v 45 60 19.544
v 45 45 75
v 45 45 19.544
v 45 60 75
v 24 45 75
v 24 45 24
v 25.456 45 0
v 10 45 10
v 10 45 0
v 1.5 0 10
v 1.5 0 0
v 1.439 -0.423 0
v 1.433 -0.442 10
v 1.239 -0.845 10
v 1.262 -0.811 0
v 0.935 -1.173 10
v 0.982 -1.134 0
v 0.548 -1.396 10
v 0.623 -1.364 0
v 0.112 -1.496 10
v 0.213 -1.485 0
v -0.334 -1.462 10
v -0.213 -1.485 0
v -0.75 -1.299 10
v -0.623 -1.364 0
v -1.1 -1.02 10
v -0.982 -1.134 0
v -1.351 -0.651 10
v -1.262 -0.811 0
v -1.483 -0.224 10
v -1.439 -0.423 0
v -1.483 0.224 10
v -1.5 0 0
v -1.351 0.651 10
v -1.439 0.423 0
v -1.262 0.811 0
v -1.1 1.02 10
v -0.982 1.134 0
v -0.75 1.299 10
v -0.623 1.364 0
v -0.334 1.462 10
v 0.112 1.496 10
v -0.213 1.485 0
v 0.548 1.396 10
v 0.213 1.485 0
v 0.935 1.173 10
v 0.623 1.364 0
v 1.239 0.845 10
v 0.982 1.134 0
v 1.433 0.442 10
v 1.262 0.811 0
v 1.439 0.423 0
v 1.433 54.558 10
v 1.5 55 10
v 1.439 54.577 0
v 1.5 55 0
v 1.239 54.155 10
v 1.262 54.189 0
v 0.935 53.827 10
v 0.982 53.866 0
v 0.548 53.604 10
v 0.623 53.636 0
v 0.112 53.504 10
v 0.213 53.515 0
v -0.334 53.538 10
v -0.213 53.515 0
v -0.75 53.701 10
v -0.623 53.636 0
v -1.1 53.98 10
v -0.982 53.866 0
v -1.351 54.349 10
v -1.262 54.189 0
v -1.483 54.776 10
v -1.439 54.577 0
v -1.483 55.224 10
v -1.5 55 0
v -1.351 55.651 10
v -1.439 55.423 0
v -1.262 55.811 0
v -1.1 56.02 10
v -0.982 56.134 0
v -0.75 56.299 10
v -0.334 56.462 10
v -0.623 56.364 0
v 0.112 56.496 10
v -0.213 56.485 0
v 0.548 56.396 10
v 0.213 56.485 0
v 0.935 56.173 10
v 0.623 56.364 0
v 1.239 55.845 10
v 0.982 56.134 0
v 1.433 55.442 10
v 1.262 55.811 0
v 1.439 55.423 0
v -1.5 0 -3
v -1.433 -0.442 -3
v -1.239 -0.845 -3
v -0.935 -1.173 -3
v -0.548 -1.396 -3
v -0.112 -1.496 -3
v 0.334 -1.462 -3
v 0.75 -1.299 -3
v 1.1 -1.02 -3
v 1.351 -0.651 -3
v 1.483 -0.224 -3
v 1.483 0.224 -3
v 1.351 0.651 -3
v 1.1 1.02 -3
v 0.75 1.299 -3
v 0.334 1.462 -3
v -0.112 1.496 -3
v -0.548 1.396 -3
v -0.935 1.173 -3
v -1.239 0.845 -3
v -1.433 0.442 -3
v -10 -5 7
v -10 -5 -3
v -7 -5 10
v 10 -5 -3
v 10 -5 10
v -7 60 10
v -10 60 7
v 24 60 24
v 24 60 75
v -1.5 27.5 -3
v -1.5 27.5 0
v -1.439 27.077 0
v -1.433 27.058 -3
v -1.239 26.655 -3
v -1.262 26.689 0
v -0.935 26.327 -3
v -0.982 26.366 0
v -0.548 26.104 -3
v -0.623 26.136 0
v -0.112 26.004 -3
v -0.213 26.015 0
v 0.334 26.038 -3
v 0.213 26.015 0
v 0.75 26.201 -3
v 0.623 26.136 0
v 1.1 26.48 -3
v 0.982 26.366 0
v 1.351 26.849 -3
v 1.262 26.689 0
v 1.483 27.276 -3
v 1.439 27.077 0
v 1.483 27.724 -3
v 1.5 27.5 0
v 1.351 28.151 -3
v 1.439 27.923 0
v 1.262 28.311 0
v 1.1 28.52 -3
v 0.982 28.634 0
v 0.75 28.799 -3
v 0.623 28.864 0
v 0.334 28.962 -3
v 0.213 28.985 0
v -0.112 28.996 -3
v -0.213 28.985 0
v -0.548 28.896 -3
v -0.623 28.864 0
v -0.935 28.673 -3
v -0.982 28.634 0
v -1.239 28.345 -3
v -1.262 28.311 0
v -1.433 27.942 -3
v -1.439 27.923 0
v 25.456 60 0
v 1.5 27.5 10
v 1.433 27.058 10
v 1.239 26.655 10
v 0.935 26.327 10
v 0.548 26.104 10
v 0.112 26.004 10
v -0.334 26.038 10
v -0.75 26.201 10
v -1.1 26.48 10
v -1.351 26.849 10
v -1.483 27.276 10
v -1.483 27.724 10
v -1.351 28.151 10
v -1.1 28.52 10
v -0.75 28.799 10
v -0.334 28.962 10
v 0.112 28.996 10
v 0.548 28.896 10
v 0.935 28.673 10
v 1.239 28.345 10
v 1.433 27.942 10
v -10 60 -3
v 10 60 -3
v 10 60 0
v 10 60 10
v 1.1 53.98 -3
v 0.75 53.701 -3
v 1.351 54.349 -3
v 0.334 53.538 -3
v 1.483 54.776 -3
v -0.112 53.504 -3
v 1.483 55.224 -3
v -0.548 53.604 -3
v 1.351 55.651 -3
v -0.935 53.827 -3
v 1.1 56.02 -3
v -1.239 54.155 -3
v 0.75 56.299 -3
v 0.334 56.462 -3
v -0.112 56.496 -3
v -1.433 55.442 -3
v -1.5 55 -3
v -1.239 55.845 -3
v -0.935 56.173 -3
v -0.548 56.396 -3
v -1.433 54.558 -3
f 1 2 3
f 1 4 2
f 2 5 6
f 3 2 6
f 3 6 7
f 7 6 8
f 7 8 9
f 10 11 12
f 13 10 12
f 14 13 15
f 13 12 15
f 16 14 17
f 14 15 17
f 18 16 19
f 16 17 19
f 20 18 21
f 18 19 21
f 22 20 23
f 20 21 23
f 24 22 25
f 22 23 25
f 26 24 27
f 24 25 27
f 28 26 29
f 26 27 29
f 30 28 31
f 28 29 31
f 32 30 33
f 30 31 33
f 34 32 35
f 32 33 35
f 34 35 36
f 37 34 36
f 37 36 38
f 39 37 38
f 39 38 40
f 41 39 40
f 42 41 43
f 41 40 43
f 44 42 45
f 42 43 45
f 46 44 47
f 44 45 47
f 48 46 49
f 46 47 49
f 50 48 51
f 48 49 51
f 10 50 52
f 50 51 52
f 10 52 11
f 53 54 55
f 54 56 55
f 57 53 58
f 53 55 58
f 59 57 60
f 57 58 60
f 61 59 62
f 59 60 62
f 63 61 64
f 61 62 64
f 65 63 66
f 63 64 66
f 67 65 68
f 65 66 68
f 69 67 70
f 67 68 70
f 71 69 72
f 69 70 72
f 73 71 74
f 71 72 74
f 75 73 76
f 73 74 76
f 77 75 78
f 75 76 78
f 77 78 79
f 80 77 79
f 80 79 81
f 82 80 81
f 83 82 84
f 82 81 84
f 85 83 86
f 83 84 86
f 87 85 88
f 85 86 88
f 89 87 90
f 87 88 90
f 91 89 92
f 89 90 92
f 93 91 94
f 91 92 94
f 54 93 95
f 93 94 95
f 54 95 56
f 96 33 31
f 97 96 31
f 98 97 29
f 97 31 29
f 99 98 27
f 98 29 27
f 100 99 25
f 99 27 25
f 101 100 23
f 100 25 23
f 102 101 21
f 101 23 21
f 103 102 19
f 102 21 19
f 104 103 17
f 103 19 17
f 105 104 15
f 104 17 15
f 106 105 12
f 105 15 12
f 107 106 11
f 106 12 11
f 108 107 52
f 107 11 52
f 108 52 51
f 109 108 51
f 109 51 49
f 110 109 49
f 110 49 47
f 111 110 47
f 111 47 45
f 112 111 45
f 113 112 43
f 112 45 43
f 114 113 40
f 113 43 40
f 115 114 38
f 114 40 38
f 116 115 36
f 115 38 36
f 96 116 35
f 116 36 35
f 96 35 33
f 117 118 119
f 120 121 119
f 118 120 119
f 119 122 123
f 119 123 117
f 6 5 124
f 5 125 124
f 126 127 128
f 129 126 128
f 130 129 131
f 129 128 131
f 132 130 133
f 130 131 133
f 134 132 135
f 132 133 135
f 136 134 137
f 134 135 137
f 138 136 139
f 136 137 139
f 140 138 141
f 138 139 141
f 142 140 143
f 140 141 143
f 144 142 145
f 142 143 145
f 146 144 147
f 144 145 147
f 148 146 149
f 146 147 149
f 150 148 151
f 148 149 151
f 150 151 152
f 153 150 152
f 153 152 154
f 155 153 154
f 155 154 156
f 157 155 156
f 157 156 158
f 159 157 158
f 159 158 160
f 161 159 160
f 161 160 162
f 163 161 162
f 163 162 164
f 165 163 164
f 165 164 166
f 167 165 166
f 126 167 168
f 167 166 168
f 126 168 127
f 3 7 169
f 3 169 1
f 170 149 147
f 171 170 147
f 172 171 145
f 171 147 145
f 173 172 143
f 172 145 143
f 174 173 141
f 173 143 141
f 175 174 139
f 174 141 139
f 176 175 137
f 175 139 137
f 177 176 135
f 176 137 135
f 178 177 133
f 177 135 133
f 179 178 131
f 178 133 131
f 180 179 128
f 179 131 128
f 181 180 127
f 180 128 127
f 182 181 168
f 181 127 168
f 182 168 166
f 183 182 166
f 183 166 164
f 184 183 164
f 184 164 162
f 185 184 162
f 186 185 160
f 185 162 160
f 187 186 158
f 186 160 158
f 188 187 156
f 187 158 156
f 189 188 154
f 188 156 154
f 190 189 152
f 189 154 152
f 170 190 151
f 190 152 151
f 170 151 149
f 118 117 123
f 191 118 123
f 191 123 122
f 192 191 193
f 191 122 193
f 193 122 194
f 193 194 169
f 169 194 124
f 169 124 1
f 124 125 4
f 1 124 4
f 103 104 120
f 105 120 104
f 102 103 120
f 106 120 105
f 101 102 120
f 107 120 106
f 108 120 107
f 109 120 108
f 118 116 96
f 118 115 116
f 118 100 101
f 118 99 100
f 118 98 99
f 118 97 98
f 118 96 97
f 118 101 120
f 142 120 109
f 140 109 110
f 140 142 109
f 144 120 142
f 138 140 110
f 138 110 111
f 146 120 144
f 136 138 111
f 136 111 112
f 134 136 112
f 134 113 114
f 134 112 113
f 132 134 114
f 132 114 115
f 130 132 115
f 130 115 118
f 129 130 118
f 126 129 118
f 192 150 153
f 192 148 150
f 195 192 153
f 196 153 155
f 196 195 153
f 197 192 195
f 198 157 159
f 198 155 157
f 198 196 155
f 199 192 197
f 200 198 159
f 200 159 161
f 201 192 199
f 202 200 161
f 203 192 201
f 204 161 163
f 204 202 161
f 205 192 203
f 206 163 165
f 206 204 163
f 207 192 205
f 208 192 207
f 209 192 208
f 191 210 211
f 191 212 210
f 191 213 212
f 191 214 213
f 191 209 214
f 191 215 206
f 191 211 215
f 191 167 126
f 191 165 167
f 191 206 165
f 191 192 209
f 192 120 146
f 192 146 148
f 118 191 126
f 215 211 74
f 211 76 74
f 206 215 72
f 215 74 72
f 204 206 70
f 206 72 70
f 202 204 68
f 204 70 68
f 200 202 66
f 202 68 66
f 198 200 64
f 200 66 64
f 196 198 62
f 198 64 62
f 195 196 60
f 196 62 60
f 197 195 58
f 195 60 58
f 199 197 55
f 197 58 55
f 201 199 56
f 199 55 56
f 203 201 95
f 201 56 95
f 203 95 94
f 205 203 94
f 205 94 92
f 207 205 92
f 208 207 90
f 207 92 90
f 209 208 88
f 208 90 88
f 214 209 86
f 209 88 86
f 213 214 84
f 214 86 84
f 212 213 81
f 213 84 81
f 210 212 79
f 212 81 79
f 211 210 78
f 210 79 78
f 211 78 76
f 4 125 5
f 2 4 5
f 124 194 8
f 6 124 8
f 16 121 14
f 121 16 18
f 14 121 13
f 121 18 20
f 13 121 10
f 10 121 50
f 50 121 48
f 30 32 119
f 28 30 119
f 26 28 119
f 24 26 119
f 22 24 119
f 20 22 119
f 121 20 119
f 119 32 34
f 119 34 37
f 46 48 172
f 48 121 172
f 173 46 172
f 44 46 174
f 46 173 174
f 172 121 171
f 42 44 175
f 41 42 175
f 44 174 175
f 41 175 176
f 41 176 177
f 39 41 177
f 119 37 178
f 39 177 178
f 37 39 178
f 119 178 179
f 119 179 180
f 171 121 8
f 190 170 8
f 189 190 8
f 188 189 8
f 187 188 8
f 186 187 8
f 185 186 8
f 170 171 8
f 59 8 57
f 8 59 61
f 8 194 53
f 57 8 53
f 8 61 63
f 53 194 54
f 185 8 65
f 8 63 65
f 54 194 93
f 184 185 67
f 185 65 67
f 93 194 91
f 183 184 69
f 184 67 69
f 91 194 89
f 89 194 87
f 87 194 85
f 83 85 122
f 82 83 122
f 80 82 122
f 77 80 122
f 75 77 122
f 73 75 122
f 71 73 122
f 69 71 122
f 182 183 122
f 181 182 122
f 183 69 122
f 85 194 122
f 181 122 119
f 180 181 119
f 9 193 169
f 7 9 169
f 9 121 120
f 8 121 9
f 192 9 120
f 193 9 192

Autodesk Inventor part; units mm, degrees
ref_plane "YZ Plane" through (0, 0, 0) normal (1, 0, 0) x (0, 1, 0)
ref_plane "XZ Plane" through (0, 0, 0) normal (0, 1, 0) x (-1, 0, 0)
ref_plane "XY Plane" through (0, 0, 0) normal (0, 0, 1) x (1, 0, 0)
sketch "Sketch9" plane through (0, 0, 0) normal (0, 0, 1) x (1, 0, 0)
  line L0 (0, 0) -> (0, 55) construction
  circle A0 centre (0, 55) radius 1.5
  circle A1 centre (0, 0) radius 1.5
  circle A2 centre (0, 27.5) radius 1.5
  line L1 (-10, 60) -> (10, 60)
  line L2 (10, 60) -> (10, -5)
  line L3 (10, -5) -> (-10, -5)
  line L4 (-10, -5) -> (-10, 60)
  point P0 (-10, 27.5)
  point P1 (0, 60)
  dimension "d35" = 55
  dimension "d36" = 3
  dimension "d37" = 3
  dimension "d38" = 3
  dimension "d39" = 5
  dimension "d40" = 10
extrude "Extrusion9" add sketch "Sketch9" along normal blind 10
sketch "Sketch11" plane through (10, -5, 0) normal (1, 0, 0) x (0, 0, -1)
  line L0 (0, 65) -> (-10, 65) projected
  line L1 (0, 65) -> (-75, 65)
  line L2 (-75, 65) -> (-75, 50)
  line L3 (-75, 50) -> (0, 50)
  line L4 (0, 50) -> (0, 65)
  point P0 (0, 5)
  dimension "d43" = 15
  dimension "d44" = 75
extrude "Extrusion10" add sketch "Sketch11" along normal blind 35
sketch "Sketch12" plane through (-10, 60, 10) normal (0, 1, 0) x (1, 0, 0)
  line L0 (20, -65) -> (20, 0) projected
  line L1 (20, -65) -> (34, -65)
  line L2 (34, -65) -> (34, 0)
  line L3 (34, 0) -> (20, 0)
  line L4 (20, 0) -> (20, -65)
  point P0 (10, 10)
  dimension "d47" = 14
extrude "Extrusion11" cut sketch "Sketch12" against normal through all
chamfer "Chamfer6" distance 14 angle 45 1 edges at (24, 52.5, 10)
sketch "Sketch14" plane through (10, 45, 0) normal (0, -1, 0) x (1, 0, 0)
  line L0 (0, 10) -> (14, 24) projected
  line L1 (15.4558, 0) -> (35, 19.5442)
  line L2 (35, 75) -> (35, 0) projected
  line L3 (0, 0) -> (35, 0) projected
  line L4 (15.4558, 0) -> (35, 0)
  line L5 (35, 19.5442) -> (35, 0)
  point P0 (-10, 0)
  dimension "d73" = 18
extrude "Extrusion13" cut sketch "Sketch14" against normal through all
sketch "Sketch15" plane through (0, 0, 0) normal (0, 0, -1) x (-1, 0, 0)
  line L0 (-25.4558, 60) -> (-25.4558, 45) projected
  line L1 (-10, 45) -> (-25.4558, 45) projected
  line L2 (-10, 45) -> (-10, -5) projected
  line L3 (-10, -5) -> (10, -5) projected
  line L4 (10, -5) -> (10, 60) projected
  line L5 (10, 60) -> (-25.4558, 60) projected
  circle A0 centre (0, 55) radius 1.5 projected
  circle A1 centre (0, 0) radius 1.5 projected
  circle A2 centre (0, 27.5) radius 1.5 projected
  line L6 (-10, -5) -> (10, -5) projected
  line L7 (10, 60) -> (-10, 60) projected
  line L8 (-10, -5) -> (-10, 60)
  line L9 (-10, 60) -> (10, 60)
extrude "Extrusion14" add sketch "Sketch15" along normal blind 3 contours L5 L4 L3 L2 L8
chamfer "Chamfer8" distance 3 angle 45 1 edges at (-10, 27.5, 10)
equation "\"Module\" = 2"
equation "\"PressureAngle\" = 20deg"
equation "\"UnitProfileClearance\" = 0.25"
equation "\"UnitRoundRadius\" = 0.35"
equation "\"HeadDiameter\" = 42"
equation "\"RootDiameter\" = 33"
equation "\"BaseDiameter\" = 35.70832"
equation "\"PitchDiameter\" = 38"
equation "\"HelixAngle\" = 0"
equation "\"UnitCorrection\" = 0"
equation "\"UnitAddendumModification\" = 0"
equation "\"CircularPitch\" = 6.283185"
equation "\"UnitBacklashShift\" = 0"
equation "\"TotalToolShift\" = 0"
equation "\"IsInternal\" = 0"
properties part number "GA04" material "ABS Plastic"
